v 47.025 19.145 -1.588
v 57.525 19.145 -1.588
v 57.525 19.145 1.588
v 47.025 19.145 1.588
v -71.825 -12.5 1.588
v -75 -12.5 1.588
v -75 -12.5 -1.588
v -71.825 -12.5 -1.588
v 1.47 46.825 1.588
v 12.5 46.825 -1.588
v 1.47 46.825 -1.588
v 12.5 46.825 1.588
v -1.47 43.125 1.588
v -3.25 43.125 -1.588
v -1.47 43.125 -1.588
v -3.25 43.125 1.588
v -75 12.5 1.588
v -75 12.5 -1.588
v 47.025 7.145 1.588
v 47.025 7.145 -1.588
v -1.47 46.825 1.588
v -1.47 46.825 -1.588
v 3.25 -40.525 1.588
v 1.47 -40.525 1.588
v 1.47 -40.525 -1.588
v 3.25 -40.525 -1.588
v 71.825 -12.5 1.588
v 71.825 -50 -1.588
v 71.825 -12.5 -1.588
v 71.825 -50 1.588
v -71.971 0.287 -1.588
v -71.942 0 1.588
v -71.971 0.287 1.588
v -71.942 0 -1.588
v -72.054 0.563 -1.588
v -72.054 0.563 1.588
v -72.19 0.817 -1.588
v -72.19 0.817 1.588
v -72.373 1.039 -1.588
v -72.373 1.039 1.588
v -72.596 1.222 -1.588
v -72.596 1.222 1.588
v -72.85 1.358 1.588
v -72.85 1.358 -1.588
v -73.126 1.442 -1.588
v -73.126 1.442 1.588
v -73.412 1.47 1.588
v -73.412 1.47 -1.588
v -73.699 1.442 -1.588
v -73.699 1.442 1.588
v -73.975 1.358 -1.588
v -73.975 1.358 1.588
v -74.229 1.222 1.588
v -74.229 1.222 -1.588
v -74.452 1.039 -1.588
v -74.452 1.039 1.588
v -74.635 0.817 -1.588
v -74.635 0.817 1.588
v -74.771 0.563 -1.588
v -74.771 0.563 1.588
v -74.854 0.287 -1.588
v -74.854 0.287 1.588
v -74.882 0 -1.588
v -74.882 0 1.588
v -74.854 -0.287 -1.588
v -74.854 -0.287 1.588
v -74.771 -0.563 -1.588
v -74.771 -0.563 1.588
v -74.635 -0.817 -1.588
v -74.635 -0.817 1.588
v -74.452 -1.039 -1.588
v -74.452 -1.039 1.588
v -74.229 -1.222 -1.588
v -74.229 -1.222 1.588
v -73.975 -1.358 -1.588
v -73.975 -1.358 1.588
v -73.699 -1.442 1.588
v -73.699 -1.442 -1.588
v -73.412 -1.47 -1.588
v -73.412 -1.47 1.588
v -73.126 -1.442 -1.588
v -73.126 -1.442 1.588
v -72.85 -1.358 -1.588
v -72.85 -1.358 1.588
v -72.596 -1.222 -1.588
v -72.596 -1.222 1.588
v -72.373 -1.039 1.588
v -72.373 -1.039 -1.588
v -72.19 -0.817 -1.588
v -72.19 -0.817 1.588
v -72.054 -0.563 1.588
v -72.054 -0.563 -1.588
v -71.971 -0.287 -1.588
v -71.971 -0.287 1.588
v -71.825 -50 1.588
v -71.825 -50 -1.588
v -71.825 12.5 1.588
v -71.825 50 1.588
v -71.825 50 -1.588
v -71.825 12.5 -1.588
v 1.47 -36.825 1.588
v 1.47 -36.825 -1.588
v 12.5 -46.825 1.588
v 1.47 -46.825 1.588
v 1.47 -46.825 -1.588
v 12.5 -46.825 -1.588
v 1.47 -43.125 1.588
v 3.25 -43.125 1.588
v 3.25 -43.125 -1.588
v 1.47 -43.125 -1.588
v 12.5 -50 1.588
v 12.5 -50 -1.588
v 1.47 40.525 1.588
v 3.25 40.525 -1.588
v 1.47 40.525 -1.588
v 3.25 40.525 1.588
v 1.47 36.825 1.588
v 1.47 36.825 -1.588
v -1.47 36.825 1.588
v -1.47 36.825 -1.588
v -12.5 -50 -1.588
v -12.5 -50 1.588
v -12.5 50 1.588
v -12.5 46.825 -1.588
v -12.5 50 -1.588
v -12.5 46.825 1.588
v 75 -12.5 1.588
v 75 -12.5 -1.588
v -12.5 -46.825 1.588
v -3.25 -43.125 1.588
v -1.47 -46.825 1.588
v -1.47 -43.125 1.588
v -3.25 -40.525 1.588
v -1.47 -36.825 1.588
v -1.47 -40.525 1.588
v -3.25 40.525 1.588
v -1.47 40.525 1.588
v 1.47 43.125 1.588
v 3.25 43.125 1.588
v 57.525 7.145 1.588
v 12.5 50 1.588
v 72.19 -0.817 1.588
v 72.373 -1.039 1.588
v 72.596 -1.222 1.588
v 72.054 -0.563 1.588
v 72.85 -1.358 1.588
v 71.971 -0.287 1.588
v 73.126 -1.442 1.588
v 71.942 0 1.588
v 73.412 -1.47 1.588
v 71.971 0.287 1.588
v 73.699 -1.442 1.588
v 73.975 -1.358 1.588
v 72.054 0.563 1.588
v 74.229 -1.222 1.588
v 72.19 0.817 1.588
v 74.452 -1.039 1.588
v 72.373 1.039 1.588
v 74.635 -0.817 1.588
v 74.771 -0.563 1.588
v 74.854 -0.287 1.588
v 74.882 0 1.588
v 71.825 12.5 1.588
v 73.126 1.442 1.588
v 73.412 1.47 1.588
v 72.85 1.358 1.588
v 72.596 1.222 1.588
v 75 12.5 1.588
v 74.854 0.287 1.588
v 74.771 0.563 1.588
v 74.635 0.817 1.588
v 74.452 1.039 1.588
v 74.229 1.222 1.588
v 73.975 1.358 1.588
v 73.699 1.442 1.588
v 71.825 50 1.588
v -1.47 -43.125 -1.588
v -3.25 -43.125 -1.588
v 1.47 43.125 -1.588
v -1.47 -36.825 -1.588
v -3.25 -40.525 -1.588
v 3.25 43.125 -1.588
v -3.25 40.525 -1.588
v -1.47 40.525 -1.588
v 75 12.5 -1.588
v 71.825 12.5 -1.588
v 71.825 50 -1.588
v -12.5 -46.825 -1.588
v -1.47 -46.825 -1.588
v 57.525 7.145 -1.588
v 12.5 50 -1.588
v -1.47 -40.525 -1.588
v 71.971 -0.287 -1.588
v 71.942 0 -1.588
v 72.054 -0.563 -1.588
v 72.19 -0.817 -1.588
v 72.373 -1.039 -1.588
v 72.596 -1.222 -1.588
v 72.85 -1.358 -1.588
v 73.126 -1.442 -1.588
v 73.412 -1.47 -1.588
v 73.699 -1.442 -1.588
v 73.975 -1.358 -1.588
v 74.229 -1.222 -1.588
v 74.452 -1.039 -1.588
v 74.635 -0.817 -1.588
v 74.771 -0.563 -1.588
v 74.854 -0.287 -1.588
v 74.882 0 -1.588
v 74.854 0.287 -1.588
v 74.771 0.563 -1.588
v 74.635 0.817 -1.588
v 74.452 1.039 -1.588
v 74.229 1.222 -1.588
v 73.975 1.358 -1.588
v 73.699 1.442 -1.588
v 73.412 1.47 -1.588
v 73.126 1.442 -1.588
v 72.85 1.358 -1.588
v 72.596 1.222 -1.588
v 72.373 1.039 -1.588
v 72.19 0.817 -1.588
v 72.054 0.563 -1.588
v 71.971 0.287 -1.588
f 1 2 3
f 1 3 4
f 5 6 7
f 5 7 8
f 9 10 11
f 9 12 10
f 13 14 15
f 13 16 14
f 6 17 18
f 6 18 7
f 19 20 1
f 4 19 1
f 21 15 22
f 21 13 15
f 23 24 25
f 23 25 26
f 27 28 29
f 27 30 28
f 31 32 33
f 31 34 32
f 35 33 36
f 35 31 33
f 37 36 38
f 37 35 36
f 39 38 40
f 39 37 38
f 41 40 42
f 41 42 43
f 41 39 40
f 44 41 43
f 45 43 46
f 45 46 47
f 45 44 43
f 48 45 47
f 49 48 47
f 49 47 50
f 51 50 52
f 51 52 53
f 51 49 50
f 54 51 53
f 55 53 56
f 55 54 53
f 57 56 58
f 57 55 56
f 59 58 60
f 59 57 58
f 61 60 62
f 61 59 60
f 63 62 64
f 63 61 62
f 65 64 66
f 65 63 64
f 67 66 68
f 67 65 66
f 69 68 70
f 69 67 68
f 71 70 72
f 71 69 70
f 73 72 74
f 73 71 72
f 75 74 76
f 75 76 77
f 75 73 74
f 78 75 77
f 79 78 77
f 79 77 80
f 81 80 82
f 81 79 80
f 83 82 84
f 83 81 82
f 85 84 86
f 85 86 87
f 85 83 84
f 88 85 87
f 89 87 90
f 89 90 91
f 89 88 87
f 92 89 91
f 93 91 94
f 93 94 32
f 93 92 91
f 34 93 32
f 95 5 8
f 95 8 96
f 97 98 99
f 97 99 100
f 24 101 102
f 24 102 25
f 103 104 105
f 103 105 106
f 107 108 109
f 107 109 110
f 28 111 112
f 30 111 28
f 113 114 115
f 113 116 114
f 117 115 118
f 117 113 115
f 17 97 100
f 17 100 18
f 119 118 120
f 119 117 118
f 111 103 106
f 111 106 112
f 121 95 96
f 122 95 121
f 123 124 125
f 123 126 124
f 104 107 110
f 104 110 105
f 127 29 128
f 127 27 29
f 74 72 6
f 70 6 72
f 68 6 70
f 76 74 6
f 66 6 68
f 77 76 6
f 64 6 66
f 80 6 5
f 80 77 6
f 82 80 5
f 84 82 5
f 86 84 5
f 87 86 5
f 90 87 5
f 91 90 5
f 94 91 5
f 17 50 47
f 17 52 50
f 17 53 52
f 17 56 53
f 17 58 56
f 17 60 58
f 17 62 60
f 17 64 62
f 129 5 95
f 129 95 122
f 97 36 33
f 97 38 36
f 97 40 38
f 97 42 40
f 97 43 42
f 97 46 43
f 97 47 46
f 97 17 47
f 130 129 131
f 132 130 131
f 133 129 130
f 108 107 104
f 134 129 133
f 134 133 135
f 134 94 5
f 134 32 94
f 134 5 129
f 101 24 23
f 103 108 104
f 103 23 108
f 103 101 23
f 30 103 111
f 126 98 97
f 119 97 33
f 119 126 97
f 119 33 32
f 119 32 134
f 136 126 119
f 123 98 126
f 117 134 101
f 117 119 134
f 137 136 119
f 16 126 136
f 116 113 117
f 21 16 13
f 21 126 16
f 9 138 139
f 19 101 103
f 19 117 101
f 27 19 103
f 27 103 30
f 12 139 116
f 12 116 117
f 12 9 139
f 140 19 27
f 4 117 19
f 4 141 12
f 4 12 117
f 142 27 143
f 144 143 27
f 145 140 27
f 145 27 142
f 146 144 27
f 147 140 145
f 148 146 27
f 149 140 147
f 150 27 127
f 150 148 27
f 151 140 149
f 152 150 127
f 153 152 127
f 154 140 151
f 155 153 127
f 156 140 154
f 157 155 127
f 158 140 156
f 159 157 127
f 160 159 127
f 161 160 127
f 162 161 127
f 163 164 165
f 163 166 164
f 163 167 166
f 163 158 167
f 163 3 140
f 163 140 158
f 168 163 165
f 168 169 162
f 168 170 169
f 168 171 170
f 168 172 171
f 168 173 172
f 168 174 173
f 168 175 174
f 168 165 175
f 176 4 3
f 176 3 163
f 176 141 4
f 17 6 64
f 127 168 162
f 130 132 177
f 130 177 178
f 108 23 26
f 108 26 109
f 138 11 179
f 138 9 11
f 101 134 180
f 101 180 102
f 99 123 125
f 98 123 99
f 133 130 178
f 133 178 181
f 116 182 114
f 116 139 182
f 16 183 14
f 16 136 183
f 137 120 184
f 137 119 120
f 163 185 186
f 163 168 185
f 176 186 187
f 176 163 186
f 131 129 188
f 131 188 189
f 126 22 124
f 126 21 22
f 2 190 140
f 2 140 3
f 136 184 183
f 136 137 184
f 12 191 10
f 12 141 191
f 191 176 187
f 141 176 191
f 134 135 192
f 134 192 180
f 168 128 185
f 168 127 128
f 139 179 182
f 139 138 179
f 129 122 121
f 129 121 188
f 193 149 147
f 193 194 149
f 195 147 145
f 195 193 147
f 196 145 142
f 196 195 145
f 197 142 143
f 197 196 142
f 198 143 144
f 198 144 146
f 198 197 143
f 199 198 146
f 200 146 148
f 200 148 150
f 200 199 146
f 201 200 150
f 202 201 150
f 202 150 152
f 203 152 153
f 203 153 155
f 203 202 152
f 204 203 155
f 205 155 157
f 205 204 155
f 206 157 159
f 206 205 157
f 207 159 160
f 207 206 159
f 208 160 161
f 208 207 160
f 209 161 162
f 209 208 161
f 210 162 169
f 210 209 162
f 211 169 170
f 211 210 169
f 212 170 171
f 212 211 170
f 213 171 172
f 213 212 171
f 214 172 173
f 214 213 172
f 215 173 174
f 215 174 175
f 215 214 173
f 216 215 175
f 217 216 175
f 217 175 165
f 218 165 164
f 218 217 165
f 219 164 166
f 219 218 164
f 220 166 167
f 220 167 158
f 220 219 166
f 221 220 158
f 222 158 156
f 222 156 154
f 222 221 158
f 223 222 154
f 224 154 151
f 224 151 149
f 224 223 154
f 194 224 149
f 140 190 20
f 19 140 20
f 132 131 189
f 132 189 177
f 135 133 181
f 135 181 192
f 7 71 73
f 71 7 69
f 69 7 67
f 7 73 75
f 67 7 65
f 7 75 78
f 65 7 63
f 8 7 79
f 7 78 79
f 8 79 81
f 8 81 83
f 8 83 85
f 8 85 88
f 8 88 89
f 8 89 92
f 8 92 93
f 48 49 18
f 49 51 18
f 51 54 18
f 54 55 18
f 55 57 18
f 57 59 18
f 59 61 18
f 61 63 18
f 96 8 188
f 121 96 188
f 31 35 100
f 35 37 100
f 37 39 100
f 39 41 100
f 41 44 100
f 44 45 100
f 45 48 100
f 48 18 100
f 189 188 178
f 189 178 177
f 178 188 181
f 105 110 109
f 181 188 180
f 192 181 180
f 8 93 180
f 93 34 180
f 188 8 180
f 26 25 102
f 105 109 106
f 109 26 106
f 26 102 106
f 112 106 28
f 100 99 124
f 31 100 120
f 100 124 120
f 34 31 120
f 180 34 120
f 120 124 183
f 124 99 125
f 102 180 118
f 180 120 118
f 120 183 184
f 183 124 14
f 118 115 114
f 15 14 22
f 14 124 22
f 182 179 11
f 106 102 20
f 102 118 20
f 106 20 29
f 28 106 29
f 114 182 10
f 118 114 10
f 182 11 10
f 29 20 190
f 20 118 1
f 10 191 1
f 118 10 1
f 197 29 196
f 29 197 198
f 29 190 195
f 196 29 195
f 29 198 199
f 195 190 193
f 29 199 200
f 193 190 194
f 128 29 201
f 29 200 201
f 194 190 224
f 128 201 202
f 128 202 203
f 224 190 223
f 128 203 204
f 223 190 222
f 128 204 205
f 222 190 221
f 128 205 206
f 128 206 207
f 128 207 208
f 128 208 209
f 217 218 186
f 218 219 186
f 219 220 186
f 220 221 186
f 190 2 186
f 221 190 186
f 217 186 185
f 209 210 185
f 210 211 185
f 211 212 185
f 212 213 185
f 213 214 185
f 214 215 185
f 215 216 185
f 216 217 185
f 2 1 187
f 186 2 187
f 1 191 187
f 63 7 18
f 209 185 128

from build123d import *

# Parameters (mm, degrees)
SKETCH1_R           = 1.47
BOSS_EXTRUDE1_DEPTH = 1.5875
SKETCH3_W           = 10.5
SKETCH3_H           = 12
CUT_EXTRUDE1_DEPTH  = 91.1946818


with BuildPart() as part:
    # Sketch1 → Boss-Extrude1 (new, symmetric)
    with BuildSketch(Plane.XY):
        Polygon((-12.5, 50), (-71.825, 50), (-71.825, 12.5), (-75, 12.5), (-75, -12.5), (-71.825, -12.5), (-71.825, -50), (-12.5, -50), (-12.5, -46.825), (-1.47, -46.825), (-1.47, -43.125), (-3.25, -43.125), (-3.25, -40.525), (-1.47, -40.525), (-1.47, -36.825), (1.47, -36.825), (1.47, -40.525), (3.25, -40.525), (3.25, -43.125), (1.47, -43.125), (1.47, -46.825), (12.5, -46.825), (12.5, -50), (71.825, -50), (71.825, -12.5), (75, -12.5), (75, 12.5), (71.825, 12.5), (71.825, 50), (12.5, 50), (12.5, 46.825), (1.47, 46.825), (1.47, 43.125), (3.25, 43.125), (3.25, 40.525), (1.47, 40.525), (1.47, 36.825), (-1.47, 36.825), (-1.47, 40.525), (-3.25, 40.525), (-3.25, 43.125), (-1.47, 43.125), (-1.47, 46.825), (-12.5, 46.825), align=None)
        with Locations((-73.4125, 0)):
            Circle(SKETCH1_R, mode=Mode.SUBTRACT)
        with Locations(Location((73.4125, 0, 0), (0, 0, 180))):
            Circle(SKETCH1_R, mode=Mode.SUBTRACT)
    extrude(amount=BOSS_EXTRUDE1_DEPTH, both=True)

    # Sketch3 → Cut-Extrude1 (cut, through all)
    with BuildSketch(Plane(origin=(0, 0, -1.5875), x_dir=(-1, 0, 0), z_dir=(0, 0, -1))):
        with Locations((-52.275, 13.144805742)):
            Rectangle(SKETCH3_W, SKETCH3_H)
    extrude(amount=-CUT_EXTRUDE1_DEPTH, mode=Mode.SUBTRACT)


solid = part.part
